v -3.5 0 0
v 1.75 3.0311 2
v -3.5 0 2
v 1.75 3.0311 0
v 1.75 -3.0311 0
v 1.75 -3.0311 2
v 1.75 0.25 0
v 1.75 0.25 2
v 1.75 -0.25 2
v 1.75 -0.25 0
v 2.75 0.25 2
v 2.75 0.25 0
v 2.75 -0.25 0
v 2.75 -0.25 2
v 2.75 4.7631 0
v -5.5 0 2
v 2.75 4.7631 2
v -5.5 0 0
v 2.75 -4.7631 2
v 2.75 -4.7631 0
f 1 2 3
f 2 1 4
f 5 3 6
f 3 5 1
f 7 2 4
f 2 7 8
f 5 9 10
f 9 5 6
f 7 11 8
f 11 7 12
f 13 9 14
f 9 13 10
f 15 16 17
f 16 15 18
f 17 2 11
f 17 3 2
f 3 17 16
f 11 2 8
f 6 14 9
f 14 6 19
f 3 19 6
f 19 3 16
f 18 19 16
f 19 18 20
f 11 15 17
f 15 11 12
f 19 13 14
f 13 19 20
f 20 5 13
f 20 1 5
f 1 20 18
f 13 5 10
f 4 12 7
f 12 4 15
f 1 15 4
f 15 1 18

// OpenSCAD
// [FL_INDEX: keywords="openscad, 3d_parametric, Lairds_Customizable_Clip, csg_solid" | COT="Parametric OpenSCAD design from 3DCodeverse"]
// Title: Lairds Customizable Clip

// ===== file: Lairds_Customizable_Clip.scad =====
// Customizable Clip

// For clipping together wires, etc.

// Gap between ends
gap=0.5;
// Thickness of clip
thickness=2;
// Inner diameter of clip
diameter=7;
// Number of sides
sides=3; //[3:32]

$fn=sides;

difference() {
	rotate([0,0,360/sides/2]) cylinder(r=diameter/2+thickness, h=thickness);
	translate([0,0,-1]) {
		rotate([0,0,360/sides/2]) cylinder(r=diameter/2, h=thickness+2);
		translate([0,-gap/2,0]) cube([diameter,gap,thickness+2]);
		}
	}
